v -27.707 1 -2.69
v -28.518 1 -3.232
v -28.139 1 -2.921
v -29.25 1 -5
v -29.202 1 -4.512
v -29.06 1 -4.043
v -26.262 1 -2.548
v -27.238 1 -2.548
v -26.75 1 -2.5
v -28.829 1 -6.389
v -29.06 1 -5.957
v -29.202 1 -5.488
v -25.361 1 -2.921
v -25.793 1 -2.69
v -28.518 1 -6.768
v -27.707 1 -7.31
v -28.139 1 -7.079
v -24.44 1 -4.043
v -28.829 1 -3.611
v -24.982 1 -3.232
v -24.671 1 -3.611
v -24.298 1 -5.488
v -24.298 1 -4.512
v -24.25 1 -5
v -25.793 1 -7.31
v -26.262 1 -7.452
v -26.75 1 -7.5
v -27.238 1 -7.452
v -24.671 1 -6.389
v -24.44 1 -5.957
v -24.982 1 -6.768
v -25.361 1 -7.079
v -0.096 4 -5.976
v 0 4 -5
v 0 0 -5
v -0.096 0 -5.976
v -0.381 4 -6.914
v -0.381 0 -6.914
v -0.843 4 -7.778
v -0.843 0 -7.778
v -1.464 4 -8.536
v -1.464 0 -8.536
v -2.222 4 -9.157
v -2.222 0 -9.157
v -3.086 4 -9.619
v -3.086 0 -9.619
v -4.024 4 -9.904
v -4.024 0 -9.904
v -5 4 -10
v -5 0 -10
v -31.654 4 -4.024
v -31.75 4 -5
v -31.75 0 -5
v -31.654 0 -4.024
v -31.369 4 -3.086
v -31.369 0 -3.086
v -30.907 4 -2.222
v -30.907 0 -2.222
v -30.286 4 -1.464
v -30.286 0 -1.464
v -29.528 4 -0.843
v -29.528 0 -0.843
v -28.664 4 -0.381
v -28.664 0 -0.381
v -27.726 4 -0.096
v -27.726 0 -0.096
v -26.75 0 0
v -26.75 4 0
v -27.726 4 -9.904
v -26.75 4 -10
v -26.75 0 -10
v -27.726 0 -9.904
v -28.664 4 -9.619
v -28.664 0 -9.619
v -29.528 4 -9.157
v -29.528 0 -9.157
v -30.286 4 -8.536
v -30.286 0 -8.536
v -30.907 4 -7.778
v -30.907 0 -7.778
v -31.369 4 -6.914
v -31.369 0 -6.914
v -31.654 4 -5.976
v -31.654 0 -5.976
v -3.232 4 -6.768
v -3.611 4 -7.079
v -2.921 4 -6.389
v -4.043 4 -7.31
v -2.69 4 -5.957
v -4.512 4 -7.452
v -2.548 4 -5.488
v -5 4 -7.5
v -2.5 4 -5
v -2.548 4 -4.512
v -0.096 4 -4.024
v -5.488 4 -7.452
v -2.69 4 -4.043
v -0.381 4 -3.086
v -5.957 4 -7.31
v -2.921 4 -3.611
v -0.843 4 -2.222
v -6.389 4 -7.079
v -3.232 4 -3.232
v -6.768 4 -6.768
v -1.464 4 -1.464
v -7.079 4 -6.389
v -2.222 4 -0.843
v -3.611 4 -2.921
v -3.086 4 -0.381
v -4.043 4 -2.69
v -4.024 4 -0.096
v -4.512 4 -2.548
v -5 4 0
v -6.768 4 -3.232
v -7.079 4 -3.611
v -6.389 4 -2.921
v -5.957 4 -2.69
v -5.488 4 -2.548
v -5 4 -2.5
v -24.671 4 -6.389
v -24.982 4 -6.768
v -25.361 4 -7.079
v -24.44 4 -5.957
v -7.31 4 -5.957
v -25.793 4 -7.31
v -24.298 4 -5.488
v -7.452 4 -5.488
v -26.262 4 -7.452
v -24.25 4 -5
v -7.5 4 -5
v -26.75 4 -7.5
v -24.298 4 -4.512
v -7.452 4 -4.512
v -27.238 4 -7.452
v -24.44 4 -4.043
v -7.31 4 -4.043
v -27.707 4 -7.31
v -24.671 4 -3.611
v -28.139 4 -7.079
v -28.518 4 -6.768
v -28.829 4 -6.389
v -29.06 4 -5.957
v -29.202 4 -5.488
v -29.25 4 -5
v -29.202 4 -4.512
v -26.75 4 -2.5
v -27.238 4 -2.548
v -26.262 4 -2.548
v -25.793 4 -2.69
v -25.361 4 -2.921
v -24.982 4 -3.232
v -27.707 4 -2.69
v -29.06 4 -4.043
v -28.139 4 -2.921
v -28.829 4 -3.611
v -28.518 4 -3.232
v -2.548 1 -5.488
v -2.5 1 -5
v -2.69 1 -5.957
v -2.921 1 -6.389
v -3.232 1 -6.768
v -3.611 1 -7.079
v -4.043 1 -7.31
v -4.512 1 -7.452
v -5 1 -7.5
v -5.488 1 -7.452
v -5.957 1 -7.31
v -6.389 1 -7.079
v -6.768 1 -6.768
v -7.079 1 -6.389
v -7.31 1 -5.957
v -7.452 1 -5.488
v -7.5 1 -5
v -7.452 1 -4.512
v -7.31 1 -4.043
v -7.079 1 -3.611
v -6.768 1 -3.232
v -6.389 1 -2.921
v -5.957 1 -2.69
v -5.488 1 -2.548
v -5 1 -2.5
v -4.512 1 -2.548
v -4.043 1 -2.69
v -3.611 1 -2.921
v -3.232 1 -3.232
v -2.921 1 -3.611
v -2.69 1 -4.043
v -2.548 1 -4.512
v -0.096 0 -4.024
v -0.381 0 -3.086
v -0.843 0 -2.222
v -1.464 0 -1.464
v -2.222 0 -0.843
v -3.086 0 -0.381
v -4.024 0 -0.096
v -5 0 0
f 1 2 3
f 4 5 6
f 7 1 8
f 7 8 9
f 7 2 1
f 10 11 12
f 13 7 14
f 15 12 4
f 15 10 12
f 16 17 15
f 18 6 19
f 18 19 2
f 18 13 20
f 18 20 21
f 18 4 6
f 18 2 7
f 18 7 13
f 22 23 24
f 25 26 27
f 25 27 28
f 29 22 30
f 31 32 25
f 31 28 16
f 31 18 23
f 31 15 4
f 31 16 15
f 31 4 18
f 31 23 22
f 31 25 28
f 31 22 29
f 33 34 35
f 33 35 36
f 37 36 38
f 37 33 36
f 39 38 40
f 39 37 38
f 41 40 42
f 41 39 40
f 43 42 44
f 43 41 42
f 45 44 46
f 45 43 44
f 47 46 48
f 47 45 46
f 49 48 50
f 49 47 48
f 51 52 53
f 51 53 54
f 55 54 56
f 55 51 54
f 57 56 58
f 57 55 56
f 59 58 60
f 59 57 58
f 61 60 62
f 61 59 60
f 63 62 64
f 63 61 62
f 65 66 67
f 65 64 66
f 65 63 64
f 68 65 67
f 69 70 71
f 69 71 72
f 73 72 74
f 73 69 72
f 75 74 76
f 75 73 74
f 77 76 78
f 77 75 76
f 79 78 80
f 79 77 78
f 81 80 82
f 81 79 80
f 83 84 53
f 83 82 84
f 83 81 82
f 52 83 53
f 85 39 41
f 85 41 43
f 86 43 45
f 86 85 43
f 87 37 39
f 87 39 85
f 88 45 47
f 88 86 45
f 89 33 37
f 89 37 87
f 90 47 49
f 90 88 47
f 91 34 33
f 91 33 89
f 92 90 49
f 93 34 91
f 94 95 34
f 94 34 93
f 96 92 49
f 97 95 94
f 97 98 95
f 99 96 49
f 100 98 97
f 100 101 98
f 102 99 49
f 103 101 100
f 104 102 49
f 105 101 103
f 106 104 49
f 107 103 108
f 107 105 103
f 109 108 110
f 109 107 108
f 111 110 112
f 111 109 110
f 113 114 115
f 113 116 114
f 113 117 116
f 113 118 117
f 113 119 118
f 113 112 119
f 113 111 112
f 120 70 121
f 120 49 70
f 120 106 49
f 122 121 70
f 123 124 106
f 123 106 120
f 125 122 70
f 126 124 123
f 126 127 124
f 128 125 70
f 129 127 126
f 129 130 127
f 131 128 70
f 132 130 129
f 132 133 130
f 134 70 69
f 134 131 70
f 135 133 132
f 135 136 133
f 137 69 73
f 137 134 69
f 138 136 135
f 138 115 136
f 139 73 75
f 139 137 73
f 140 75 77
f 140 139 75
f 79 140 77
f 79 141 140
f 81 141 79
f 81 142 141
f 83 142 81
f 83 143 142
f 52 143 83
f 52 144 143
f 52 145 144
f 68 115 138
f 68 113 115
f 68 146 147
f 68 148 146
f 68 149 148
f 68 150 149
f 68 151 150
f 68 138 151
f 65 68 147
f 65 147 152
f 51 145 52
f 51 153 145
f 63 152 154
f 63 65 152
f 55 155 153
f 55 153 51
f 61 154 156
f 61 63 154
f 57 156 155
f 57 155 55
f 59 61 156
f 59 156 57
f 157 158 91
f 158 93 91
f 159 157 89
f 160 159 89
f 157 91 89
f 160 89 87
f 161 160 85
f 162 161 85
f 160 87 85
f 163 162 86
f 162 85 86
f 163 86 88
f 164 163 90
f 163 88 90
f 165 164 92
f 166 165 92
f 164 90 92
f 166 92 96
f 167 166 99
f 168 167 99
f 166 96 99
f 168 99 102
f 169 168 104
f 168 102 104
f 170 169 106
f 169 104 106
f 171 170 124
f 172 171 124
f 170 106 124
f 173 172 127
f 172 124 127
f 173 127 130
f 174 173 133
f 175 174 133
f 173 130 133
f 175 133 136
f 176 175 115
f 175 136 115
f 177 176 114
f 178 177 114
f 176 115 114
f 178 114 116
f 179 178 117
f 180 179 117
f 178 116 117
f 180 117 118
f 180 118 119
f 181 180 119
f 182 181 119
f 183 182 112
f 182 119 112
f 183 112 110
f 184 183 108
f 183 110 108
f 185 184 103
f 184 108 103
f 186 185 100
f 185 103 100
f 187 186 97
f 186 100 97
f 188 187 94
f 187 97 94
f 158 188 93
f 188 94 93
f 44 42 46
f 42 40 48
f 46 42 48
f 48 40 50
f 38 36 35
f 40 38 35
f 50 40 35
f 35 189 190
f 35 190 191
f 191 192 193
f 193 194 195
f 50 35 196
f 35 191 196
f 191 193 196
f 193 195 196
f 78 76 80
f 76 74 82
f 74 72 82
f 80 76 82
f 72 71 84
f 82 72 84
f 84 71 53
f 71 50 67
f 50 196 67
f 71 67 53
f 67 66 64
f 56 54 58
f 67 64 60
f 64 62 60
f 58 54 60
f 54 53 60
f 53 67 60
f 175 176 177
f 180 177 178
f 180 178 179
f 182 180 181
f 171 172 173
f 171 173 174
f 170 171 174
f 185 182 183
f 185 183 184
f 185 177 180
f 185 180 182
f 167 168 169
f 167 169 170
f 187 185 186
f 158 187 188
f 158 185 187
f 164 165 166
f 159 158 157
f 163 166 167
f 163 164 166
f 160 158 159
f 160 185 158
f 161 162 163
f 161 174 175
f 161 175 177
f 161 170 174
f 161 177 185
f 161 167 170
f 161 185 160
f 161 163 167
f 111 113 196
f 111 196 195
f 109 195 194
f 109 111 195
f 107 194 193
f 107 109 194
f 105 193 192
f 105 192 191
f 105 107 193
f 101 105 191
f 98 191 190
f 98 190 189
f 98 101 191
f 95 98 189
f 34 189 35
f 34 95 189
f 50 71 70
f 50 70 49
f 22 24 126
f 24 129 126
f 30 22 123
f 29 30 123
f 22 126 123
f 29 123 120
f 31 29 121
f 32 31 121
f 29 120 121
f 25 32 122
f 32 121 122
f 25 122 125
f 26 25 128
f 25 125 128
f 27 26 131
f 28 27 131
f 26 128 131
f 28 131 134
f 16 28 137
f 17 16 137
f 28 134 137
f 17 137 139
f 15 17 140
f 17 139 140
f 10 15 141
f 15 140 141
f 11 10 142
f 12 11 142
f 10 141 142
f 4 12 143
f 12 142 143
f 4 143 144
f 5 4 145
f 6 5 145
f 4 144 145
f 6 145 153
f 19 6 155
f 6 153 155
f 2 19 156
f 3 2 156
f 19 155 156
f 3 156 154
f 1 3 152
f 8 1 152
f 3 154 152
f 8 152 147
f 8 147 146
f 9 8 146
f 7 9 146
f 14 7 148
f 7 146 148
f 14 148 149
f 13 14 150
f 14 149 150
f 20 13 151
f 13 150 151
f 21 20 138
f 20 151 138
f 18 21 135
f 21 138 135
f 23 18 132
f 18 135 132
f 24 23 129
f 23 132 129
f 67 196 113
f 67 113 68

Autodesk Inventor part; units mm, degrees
ref_plane "YZ Plane" through (0, 0, 0) normal (1, 0, 0) x (0, 1, 0)
ref_plane "XZ Plane" through (0, 0, 0) normal (0, 1, 0) x (-1, 0, 0)
ref_plane "XY Plane" through (0, 0, 0) normal (0, 0, 1) x (1, 0, 0)
sketch "Sketch1" plane through (0, 0, 0) normal (0, 1, 0) x (-1, 0, 0)
  line L0 (0, 0) -> (31.75, 0)
  line L1 (31.75, 0) -> (31.75, -10)
  line L2 (31.75, -10) -> (0, -10)
  line L3 (0, -10) -> (0, 0)
  dimension "d0" = 31.75
  dimension "d1" = 10
extrude "Extrusion1" add sketch "Sketch1" along normal blind 4
sketch "Sketch2" plane through (0, 4, 0) normal (0, 1, 0) x (1, 0, 0)
  circle A0 centre (-26.75, 5) radius 2.5
  circle A1 centre (-5, 5) radius 2.5
  line L0 (-31.75, 10) -> (-31.75, 0) projected
  point P0 (0, 0)
  dimension "d4" = 5
  dimension "d5" = 5
  dimension "d6" = 5
  dimension "d7" = 5
  dimension "d8" = 5
extrude "Extrusion2" cut sketch "Sketch2" against normal blind 3
fillet "Fillet1" radius 5 4 edges at (-31.75, 2, 0) (0, 2, 0) (0, 2, -10) (-31.75, 2, -10)
properties part number "Linkage" material "Aluminum 6061"
